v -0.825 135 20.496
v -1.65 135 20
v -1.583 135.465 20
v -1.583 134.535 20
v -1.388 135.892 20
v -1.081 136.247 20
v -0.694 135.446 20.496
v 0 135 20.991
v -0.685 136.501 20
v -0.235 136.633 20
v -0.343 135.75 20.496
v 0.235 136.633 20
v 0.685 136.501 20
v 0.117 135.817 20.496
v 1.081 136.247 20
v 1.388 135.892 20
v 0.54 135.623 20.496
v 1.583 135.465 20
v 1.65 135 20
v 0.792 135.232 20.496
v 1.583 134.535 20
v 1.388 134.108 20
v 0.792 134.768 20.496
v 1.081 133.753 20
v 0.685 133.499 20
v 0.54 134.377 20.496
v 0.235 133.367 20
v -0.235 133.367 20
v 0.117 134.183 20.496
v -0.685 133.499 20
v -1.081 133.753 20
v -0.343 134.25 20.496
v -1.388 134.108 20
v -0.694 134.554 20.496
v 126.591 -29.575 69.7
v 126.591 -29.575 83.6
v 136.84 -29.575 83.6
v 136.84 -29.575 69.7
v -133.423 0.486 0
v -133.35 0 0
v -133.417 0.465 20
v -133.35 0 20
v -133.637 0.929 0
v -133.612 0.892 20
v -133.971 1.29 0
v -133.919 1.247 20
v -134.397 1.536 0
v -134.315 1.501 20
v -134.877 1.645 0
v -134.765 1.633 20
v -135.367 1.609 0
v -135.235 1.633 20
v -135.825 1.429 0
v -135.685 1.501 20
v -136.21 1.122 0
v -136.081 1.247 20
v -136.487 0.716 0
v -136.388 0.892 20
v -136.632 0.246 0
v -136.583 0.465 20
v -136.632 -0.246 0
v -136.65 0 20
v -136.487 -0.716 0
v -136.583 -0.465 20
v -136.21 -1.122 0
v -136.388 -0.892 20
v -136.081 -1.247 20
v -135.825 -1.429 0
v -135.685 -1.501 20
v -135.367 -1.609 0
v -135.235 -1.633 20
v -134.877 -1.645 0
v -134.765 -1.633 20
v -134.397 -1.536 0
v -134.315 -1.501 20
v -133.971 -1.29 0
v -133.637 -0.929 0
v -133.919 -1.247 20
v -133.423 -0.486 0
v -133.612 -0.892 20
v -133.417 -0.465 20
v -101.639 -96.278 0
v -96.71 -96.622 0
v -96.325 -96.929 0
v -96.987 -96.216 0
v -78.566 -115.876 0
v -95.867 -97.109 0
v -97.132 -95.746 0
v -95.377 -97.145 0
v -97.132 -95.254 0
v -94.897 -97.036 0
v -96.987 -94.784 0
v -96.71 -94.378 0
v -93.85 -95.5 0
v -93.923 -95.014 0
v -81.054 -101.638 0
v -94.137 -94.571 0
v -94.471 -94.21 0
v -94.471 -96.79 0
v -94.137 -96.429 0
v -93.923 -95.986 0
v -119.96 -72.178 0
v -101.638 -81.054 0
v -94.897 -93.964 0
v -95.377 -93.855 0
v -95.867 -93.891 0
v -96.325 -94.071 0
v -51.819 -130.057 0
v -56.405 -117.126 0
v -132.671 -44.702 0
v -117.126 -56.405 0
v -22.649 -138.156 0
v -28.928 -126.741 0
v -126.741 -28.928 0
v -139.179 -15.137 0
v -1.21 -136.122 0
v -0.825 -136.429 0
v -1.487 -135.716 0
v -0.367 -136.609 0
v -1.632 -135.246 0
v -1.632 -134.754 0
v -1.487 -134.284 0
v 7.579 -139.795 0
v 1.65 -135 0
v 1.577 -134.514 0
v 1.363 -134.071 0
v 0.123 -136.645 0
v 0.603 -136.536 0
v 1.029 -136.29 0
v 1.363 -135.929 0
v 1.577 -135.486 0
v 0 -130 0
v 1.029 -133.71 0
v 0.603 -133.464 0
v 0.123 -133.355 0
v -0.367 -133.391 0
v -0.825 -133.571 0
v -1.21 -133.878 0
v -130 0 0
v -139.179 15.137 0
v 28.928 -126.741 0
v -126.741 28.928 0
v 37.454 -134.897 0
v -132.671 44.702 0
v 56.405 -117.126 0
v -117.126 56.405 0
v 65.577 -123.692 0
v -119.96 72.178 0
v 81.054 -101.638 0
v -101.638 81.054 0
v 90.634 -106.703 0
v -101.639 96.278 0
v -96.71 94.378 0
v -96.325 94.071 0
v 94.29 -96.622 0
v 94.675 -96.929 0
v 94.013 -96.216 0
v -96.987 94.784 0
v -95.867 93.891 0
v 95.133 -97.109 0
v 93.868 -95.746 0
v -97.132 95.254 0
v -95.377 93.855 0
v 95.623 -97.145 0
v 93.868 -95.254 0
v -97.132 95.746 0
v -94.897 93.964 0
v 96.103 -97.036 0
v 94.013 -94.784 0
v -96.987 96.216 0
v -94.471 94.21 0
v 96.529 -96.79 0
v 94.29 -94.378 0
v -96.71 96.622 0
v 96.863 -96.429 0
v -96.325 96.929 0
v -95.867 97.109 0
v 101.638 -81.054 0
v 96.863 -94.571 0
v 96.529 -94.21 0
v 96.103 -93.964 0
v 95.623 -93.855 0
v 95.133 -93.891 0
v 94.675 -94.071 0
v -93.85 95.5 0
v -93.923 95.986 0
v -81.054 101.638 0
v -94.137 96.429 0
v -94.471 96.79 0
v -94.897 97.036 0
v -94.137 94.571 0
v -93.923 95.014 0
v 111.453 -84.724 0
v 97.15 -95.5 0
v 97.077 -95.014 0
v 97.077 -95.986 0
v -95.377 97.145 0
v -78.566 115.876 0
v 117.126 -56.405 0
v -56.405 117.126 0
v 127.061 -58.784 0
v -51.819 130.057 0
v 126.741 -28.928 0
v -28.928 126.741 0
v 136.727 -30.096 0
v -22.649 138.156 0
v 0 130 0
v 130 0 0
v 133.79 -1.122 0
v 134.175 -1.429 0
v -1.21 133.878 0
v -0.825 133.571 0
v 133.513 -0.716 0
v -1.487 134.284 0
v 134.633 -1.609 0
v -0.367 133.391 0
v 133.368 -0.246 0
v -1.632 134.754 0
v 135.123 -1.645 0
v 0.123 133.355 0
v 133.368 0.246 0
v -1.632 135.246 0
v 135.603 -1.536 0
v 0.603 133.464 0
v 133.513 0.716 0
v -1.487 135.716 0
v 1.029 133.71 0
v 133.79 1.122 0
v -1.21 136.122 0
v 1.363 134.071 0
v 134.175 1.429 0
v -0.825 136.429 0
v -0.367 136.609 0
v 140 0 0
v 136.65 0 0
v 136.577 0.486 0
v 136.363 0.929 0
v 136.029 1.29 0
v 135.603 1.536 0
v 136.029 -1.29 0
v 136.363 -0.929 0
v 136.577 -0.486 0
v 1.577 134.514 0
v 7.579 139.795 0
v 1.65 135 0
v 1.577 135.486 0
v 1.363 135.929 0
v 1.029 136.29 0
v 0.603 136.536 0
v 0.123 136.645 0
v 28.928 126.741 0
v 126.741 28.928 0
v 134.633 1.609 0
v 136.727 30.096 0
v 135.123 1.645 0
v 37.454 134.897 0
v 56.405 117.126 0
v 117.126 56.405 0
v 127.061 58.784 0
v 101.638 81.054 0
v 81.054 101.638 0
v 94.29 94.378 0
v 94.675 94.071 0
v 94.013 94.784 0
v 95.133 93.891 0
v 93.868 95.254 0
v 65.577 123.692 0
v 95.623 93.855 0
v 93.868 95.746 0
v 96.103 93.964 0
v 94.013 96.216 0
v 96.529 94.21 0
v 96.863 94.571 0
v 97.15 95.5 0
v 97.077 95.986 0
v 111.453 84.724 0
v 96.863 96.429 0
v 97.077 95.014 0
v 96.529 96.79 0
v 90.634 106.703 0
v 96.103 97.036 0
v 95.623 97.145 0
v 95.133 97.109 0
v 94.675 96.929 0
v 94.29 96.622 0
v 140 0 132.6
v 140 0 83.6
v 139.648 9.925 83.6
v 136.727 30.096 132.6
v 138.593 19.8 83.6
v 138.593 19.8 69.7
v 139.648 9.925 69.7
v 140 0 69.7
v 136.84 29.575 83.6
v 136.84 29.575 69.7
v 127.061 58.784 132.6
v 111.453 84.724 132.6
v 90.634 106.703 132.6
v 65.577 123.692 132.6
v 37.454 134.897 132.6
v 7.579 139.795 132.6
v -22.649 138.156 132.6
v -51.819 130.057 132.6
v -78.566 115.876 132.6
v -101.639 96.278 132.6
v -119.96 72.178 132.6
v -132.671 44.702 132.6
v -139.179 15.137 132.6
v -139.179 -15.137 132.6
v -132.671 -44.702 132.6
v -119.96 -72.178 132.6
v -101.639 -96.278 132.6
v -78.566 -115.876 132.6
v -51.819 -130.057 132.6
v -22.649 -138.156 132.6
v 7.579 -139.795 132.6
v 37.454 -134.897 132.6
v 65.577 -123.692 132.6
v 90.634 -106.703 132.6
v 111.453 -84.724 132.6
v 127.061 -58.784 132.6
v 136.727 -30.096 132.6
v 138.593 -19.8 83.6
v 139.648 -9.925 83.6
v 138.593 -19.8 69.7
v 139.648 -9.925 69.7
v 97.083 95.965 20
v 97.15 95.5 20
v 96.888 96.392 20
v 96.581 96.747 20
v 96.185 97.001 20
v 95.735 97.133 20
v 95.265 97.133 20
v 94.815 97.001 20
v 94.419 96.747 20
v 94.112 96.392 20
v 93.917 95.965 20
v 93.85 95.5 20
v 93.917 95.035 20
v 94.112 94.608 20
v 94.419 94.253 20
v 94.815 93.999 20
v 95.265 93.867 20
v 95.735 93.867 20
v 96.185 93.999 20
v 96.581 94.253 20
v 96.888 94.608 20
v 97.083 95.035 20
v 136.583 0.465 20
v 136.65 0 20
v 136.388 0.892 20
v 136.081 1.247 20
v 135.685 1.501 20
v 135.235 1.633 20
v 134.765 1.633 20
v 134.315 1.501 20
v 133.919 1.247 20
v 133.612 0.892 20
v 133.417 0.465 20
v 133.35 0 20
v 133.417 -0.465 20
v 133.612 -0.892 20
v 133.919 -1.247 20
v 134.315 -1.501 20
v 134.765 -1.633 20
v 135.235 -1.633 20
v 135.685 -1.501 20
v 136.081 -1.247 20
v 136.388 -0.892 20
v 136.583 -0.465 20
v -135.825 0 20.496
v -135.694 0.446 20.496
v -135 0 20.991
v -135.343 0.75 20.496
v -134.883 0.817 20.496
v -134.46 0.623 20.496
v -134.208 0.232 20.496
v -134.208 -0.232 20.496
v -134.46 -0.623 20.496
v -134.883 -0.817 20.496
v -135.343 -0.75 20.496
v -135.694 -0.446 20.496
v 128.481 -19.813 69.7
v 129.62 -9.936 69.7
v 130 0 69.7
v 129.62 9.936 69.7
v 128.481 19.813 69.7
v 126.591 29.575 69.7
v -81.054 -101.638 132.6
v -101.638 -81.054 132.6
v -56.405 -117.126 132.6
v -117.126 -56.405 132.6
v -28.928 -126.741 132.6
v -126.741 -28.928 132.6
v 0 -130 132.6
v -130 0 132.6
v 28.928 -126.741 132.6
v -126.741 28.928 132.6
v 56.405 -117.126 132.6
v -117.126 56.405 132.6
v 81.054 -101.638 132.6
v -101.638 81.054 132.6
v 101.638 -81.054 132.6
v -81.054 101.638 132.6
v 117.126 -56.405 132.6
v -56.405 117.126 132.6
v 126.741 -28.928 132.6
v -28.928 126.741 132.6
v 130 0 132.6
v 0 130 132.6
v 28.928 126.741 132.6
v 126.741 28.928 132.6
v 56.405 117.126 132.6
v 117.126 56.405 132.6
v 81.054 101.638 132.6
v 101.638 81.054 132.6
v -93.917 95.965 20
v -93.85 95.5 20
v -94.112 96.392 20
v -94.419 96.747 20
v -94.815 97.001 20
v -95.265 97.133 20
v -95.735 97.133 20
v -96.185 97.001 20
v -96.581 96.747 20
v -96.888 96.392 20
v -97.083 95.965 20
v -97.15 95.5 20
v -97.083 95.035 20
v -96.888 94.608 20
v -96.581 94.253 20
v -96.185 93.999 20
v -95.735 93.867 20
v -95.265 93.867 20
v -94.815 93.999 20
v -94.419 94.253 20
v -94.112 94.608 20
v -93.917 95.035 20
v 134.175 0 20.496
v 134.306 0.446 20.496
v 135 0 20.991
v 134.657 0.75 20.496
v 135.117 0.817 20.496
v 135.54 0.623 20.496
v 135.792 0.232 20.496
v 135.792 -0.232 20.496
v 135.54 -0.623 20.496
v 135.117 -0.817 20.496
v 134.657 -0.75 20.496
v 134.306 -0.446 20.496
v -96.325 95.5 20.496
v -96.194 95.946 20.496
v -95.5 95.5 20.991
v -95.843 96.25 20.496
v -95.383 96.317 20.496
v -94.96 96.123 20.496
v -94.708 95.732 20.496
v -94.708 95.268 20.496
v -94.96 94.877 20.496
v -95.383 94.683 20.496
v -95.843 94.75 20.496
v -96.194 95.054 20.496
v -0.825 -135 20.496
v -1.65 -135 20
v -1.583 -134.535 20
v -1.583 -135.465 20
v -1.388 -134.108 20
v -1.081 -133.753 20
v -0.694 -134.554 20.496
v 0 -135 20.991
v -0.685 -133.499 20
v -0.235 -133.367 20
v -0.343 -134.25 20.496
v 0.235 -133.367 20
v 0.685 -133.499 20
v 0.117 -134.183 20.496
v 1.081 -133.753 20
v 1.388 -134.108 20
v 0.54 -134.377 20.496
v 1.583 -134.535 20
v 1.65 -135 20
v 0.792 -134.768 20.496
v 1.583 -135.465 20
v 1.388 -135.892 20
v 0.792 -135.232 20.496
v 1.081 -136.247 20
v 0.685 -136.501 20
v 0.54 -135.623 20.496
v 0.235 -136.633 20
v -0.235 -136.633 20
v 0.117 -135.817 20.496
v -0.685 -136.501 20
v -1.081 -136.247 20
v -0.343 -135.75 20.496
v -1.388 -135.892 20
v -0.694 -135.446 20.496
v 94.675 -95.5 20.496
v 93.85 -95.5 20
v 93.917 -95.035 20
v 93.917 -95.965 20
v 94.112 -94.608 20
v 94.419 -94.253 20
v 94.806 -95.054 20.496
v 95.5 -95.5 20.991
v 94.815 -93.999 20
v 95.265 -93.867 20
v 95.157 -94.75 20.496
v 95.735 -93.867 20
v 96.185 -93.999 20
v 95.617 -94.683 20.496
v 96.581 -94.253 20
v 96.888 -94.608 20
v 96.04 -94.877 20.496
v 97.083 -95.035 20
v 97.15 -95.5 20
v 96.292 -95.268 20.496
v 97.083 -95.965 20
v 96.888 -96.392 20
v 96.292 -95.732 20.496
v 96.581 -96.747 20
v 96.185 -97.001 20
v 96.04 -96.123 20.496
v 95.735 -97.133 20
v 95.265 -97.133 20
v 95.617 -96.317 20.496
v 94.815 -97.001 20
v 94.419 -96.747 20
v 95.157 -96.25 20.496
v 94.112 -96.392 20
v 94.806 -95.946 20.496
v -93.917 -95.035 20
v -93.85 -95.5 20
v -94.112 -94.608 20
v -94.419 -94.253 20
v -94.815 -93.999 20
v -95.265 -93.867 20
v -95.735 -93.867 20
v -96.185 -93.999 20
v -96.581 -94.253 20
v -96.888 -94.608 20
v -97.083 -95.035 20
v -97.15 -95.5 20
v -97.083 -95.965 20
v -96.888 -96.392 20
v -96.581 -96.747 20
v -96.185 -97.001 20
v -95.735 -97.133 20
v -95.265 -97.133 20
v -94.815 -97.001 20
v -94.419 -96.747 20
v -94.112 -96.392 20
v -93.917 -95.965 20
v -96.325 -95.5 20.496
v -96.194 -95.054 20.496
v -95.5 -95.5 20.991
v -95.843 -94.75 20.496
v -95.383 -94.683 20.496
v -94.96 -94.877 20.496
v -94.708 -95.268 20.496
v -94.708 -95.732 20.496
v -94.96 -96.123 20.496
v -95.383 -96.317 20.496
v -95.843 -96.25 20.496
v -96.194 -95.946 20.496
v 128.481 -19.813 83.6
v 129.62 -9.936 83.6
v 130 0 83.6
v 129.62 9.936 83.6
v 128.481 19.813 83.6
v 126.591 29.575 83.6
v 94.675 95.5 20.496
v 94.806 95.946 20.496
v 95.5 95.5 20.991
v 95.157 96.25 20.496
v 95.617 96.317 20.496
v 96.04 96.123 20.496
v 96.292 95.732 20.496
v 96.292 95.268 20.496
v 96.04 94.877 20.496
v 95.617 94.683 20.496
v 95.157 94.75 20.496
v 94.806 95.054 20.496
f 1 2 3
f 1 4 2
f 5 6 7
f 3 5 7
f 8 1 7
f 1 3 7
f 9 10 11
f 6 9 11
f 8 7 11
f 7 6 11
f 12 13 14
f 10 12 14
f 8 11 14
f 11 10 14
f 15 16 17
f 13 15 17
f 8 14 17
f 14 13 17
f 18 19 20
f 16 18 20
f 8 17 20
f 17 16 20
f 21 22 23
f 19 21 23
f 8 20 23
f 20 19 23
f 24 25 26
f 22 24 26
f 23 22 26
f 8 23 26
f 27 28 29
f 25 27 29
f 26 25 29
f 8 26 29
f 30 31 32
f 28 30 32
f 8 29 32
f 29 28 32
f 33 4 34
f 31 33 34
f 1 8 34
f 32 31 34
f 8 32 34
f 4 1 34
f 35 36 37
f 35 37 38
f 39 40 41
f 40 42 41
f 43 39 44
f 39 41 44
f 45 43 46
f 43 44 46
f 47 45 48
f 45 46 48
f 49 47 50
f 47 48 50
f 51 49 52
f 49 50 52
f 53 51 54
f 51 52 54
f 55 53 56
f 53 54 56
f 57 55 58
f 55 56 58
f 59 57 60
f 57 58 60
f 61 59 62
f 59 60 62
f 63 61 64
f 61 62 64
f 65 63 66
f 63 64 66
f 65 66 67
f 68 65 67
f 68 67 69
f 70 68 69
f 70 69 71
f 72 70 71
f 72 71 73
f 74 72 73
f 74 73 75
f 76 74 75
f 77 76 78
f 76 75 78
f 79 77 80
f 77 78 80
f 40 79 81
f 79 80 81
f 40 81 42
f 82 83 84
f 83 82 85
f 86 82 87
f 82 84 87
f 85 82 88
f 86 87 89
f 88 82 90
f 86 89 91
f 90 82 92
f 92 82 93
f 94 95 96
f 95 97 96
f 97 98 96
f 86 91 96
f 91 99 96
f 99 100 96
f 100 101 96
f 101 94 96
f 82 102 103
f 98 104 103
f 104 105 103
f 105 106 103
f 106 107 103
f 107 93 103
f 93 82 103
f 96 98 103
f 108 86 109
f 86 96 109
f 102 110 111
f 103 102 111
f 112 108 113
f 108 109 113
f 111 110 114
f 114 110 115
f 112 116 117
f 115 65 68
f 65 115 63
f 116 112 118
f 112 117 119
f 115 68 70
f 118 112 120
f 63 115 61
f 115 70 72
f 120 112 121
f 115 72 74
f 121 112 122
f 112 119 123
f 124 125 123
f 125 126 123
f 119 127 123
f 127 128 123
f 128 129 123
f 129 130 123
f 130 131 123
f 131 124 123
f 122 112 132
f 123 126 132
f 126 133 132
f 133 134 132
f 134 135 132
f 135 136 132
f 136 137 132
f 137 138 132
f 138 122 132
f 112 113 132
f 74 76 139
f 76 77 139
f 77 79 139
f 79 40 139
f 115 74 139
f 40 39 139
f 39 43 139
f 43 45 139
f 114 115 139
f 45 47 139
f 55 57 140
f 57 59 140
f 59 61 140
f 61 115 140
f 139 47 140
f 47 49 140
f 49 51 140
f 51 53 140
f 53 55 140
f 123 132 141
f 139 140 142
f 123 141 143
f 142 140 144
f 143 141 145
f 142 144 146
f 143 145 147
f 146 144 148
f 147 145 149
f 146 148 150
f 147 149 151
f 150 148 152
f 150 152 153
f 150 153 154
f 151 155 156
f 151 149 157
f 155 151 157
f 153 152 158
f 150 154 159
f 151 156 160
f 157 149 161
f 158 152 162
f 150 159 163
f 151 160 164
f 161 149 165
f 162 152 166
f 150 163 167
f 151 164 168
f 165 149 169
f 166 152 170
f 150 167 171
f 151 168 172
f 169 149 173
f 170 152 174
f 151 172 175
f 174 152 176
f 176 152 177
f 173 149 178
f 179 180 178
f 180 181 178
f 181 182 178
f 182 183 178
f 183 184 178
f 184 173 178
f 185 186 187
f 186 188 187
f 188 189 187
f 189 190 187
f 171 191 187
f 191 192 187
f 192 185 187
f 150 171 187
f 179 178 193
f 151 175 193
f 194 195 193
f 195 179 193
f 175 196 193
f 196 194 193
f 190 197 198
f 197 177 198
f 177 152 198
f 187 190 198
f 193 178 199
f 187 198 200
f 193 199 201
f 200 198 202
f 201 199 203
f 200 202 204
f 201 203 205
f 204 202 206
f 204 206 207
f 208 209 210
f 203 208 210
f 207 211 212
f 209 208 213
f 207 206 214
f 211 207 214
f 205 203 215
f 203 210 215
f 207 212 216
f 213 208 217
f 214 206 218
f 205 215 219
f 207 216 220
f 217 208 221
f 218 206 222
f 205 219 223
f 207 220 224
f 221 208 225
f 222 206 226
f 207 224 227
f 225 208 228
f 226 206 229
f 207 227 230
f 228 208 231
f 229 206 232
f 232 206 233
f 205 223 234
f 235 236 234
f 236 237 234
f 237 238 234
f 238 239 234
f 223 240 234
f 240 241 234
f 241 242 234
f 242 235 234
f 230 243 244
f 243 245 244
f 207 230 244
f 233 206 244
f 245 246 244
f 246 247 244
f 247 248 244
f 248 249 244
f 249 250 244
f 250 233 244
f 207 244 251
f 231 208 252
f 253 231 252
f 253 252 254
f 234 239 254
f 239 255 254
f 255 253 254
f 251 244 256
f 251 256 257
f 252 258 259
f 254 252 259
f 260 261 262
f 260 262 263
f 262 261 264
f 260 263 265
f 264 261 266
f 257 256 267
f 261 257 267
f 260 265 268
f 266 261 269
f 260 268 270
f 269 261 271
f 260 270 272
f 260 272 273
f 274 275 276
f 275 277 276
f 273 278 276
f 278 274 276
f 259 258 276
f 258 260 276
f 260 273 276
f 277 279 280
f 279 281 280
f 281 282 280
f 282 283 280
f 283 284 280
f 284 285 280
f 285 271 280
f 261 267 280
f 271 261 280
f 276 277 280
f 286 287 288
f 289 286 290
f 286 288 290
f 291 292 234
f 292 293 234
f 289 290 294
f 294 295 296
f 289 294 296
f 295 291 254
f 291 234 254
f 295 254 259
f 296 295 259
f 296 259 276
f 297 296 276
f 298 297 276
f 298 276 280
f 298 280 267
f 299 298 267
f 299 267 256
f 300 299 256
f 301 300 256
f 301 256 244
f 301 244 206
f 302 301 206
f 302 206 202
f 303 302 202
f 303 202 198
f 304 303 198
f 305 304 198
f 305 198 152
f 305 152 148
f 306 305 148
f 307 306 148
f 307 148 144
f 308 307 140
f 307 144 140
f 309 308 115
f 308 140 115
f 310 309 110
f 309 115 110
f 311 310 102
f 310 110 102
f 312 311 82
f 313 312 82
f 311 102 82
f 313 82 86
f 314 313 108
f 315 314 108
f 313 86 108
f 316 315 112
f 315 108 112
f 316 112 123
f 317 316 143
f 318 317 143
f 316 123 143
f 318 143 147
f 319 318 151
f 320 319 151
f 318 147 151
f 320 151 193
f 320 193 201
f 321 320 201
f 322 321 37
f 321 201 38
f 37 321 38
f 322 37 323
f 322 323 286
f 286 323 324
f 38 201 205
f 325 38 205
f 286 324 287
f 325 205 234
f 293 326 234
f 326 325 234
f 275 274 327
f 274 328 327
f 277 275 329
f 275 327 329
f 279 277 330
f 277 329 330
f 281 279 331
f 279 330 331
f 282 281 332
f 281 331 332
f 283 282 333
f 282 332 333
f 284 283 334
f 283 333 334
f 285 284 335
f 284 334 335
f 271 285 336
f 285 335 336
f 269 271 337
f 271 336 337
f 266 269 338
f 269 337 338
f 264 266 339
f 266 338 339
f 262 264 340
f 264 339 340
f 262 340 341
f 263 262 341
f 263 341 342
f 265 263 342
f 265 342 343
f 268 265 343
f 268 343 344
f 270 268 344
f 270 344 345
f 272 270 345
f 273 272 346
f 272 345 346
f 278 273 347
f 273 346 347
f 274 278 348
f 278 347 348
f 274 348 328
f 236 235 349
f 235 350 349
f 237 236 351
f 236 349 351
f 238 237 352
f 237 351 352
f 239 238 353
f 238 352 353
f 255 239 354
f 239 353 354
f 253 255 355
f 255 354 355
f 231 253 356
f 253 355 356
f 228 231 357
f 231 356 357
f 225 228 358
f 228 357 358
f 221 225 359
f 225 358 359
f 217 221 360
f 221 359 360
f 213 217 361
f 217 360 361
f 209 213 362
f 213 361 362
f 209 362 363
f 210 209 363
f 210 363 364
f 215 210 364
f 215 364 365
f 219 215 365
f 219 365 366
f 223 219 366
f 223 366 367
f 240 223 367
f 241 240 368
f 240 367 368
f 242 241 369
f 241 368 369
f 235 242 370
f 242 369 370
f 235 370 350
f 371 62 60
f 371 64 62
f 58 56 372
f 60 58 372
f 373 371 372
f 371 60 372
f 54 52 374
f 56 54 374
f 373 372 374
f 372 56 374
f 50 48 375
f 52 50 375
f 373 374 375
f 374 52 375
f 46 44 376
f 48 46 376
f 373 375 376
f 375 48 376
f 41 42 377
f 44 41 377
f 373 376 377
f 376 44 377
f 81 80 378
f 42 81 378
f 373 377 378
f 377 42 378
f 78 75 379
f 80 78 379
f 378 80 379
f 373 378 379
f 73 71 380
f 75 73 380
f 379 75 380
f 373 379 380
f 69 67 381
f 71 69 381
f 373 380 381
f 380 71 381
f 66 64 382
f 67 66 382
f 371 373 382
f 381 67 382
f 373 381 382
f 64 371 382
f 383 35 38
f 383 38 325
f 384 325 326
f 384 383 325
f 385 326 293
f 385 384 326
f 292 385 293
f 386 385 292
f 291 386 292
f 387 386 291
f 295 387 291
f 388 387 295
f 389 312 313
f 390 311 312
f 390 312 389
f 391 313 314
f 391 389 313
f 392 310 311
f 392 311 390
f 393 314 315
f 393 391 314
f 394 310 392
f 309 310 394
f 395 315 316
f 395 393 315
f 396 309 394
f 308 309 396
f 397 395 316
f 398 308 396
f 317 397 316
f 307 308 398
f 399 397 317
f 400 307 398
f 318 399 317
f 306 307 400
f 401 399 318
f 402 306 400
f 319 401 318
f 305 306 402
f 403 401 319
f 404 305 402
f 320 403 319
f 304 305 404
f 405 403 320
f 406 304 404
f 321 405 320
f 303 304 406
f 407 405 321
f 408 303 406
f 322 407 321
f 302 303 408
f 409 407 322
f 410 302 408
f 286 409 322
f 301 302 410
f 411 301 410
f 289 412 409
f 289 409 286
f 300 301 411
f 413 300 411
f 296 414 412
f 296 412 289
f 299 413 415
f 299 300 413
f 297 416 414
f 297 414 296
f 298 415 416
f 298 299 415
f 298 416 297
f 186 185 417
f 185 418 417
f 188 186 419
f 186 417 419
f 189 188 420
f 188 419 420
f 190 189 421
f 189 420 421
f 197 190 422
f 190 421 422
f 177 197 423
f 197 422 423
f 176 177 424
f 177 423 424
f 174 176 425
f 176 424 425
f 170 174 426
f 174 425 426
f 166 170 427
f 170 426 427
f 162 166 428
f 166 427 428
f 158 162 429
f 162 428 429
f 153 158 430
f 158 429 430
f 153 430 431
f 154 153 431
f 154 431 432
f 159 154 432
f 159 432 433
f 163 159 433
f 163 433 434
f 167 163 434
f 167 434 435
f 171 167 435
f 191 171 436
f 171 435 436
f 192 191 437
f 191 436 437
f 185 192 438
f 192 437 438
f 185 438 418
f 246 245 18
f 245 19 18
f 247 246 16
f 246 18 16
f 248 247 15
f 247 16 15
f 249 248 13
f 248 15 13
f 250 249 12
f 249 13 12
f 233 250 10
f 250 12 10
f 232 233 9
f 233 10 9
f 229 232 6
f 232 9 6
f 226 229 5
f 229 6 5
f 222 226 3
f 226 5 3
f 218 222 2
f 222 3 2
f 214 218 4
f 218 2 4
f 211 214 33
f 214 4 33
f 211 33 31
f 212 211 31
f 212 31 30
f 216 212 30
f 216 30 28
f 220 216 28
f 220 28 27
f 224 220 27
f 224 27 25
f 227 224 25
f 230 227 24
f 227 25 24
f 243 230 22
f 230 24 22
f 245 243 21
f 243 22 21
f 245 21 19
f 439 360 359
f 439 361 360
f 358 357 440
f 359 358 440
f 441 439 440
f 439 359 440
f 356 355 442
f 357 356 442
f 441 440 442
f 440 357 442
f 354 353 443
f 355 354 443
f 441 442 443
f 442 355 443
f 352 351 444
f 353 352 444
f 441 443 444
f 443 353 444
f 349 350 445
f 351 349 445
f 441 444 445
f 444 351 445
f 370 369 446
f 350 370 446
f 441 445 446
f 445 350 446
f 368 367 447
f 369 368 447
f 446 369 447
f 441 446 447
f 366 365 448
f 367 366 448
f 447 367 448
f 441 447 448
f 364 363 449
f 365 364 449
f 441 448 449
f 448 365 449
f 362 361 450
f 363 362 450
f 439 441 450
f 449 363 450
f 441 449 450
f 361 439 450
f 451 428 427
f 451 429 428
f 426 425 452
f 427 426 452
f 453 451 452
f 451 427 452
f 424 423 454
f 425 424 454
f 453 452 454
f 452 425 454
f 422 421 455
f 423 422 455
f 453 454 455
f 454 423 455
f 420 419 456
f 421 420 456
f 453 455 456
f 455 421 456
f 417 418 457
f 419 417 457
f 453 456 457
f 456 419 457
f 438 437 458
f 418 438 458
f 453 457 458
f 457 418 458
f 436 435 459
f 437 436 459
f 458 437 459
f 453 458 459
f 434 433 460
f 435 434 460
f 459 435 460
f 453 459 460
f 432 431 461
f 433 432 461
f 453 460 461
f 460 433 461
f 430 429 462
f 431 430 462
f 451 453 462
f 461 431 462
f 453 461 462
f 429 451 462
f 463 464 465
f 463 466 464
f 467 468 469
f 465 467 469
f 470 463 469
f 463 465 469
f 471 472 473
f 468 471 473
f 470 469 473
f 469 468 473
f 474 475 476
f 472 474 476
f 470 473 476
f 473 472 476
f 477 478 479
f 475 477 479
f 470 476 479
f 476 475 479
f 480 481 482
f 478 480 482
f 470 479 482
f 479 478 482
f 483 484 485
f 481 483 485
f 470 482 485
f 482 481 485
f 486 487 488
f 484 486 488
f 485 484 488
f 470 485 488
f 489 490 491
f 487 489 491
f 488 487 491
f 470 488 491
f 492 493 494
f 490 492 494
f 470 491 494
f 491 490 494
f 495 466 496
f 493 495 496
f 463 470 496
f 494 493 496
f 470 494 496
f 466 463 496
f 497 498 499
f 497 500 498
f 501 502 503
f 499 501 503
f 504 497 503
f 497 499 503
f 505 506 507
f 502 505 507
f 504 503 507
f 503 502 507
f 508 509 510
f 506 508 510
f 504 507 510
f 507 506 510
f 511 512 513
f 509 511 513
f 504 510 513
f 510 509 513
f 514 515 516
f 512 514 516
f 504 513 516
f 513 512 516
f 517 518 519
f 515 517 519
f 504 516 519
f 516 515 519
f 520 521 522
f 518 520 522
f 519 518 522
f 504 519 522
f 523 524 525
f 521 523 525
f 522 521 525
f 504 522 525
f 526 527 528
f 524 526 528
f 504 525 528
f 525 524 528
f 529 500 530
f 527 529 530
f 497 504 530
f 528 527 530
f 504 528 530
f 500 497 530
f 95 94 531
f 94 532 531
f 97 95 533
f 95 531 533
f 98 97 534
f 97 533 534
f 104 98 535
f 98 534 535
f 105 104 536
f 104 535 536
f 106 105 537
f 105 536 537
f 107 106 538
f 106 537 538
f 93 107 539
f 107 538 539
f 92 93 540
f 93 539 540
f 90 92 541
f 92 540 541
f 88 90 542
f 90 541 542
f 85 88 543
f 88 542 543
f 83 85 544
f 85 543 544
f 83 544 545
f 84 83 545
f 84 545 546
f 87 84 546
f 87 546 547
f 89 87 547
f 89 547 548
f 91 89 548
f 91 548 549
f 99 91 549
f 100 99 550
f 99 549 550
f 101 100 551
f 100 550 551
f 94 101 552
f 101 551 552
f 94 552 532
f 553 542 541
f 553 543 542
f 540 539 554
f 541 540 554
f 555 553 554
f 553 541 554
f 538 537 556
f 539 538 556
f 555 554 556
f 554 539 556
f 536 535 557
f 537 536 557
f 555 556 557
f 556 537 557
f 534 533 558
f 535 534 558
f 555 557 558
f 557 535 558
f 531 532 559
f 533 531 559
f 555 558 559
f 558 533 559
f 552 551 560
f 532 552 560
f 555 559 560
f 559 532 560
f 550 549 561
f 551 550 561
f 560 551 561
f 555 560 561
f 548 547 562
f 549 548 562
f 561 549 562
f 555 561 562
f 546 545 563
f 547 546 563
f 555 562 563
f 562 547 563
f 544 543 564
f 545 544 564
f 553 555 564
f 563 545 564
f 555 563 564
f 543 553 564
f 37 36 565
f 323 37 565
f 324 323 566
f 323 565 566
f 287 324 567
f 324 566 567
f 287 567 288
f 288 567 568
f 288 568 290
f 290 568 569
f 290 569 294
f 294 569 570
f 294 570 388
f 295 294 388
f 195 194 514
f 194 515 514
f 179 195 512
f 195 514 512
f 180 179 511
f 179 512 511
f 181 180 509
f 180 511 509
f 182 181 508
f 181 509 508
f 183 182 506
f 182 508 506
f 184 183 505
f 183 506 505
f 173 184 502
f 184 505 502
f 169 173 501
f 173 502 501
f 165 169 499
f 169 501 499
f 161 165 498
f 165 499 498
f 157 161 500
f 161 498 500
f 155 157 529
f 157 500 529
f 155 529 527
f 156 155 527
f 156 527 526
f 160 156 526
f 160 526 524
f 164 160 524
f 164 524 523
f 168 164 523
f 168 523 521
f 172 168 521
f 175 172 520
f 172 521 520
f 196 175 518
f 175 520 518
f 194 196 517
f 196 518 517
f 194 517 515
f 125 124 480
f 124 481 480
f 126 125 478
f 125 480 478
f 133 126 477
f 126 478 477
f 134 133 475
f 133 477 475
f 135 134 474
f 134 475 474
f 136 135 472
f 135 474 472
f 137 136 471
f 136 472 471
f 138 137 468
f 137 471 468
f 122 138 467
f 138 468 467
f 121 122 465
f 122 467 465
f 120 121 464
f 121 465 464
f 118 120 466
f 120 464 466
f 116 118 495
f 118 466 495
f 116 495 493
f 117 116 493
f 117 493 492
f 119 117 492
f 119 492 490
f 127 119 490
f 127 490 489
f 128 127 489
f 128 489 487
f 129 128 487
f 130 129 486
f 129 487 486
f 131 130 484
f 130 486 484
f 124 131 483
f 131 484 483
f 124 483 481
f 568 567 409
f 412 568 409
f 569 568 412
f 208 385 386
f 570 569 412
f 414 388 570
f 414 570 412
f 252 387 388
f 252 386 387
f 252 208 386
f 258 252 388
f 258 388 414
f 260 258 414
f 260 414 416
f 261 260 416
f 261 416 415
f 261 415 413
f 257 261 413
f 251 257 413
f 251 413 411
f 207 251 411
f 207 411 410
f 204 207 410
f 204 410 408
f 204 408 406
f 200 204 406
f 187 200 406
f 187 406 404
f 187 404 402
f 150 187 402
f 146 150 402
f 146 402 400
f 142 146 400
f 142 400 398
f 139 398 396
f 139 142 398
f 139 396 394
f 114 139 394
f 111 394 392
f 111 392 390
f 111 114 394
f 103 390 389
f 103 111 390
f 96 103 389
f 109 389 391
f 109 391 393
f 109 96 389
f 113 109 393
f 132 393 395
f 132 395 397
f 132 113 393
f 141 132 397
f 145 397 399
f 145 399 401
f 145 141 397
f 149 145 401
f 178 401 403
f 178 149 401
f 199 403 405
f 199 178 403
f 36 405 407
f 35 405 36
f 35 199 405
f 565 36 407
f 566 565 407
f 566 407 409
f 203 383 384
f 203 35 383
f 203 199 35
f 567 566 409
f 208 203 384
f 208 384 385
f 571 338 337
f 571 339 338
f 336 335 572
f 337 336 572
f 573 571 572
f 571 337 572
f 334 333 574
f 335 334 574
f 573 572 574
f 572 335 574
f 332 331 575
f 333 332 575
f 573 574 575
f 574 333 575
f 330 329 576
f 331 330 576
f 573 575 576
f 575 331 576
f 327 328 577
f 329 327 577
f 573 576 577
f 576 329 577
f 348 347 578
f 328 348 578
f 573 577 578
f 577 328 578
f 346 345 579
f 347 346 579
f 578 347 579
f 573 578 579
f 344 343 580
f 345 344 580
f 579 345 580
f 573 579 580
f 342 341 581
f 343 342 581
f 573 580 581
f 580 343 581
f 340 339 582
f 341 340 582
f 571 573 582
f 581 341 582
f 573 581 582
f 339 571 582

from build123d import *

# Parameters (mm, degrees)
SKETCH1_R                 = 140
SKETCH1_R_2               = 130
BOSS_EXTRUDE1_DEPTH       = 132.6
M4X0_7_TAPPED_HOLE1_D     = 3.3
M4X0_7_TAPPED_HOLE1_DEPTH = 20
M4X0_7_TAPPED_HOLE1_TIP   = 0.991420021
SKETCH5_W                 = 13.9
SKETCH5_H                 = 59.15
CUT_EXTRUDE1_DEPTH        = 140


with BuildPart() as part:
    # Sketch1 → Boss-Extrude1 (new body)
    with BuildSketch(Plane.XY):
        Circle(SKETCH1_R)
        Circle(SKETCH1_R_2, mode=Mode.SUBTRACT)
    extrude(amount=BOSS_EXTRUDE1_DEPTH)

    # M4x0.7 Tapped Hole1
    with Locations(Plane(origin=(0, 0, 0), x_dir=(-1, 0, 0), z_dir=(0, 0, -1))):
        with Locations((0, 135), (135, 0), (95.5, 95.5), (95.5, -95.5), (0, -135), (-95.5, -95.5), (-135, 0), (-95.5, 95.5)):
            Hole(M4X0_7_TAPPED_HOLE1_D / 2, depth=M4X0_7_TAPPED_HOLE1_DEPTH)
            with Locations((0, 0, -(M4X0_7_TAPPED_HOLE1_DEPTH + M4X0_7_TAPPED_HOLE1_TIP / 2))):  # 118° drill point
                Cone(0, M4X0_7_TAPPED_HOLE1_D / 2, M4X0_7_TAPPED_HOLE1_TIP, mode=Mode.SUBTRACT)

    # Sketch5 → Cut-Extrude1 (cut)
    with BuildSketch(Plane(origin=(0, 0, 0), x_dir=(0, 0, -1), z_dir=(1, 0, 0))):
        with Locations((-76.65, 0)):
            Rectangle(SKETCH5_W, SKETCH5_H)
    extrude(amount=CUT_EXTRUDE1_DEPTH, mode=Mode.SUBTRACT)


solid = part.part
